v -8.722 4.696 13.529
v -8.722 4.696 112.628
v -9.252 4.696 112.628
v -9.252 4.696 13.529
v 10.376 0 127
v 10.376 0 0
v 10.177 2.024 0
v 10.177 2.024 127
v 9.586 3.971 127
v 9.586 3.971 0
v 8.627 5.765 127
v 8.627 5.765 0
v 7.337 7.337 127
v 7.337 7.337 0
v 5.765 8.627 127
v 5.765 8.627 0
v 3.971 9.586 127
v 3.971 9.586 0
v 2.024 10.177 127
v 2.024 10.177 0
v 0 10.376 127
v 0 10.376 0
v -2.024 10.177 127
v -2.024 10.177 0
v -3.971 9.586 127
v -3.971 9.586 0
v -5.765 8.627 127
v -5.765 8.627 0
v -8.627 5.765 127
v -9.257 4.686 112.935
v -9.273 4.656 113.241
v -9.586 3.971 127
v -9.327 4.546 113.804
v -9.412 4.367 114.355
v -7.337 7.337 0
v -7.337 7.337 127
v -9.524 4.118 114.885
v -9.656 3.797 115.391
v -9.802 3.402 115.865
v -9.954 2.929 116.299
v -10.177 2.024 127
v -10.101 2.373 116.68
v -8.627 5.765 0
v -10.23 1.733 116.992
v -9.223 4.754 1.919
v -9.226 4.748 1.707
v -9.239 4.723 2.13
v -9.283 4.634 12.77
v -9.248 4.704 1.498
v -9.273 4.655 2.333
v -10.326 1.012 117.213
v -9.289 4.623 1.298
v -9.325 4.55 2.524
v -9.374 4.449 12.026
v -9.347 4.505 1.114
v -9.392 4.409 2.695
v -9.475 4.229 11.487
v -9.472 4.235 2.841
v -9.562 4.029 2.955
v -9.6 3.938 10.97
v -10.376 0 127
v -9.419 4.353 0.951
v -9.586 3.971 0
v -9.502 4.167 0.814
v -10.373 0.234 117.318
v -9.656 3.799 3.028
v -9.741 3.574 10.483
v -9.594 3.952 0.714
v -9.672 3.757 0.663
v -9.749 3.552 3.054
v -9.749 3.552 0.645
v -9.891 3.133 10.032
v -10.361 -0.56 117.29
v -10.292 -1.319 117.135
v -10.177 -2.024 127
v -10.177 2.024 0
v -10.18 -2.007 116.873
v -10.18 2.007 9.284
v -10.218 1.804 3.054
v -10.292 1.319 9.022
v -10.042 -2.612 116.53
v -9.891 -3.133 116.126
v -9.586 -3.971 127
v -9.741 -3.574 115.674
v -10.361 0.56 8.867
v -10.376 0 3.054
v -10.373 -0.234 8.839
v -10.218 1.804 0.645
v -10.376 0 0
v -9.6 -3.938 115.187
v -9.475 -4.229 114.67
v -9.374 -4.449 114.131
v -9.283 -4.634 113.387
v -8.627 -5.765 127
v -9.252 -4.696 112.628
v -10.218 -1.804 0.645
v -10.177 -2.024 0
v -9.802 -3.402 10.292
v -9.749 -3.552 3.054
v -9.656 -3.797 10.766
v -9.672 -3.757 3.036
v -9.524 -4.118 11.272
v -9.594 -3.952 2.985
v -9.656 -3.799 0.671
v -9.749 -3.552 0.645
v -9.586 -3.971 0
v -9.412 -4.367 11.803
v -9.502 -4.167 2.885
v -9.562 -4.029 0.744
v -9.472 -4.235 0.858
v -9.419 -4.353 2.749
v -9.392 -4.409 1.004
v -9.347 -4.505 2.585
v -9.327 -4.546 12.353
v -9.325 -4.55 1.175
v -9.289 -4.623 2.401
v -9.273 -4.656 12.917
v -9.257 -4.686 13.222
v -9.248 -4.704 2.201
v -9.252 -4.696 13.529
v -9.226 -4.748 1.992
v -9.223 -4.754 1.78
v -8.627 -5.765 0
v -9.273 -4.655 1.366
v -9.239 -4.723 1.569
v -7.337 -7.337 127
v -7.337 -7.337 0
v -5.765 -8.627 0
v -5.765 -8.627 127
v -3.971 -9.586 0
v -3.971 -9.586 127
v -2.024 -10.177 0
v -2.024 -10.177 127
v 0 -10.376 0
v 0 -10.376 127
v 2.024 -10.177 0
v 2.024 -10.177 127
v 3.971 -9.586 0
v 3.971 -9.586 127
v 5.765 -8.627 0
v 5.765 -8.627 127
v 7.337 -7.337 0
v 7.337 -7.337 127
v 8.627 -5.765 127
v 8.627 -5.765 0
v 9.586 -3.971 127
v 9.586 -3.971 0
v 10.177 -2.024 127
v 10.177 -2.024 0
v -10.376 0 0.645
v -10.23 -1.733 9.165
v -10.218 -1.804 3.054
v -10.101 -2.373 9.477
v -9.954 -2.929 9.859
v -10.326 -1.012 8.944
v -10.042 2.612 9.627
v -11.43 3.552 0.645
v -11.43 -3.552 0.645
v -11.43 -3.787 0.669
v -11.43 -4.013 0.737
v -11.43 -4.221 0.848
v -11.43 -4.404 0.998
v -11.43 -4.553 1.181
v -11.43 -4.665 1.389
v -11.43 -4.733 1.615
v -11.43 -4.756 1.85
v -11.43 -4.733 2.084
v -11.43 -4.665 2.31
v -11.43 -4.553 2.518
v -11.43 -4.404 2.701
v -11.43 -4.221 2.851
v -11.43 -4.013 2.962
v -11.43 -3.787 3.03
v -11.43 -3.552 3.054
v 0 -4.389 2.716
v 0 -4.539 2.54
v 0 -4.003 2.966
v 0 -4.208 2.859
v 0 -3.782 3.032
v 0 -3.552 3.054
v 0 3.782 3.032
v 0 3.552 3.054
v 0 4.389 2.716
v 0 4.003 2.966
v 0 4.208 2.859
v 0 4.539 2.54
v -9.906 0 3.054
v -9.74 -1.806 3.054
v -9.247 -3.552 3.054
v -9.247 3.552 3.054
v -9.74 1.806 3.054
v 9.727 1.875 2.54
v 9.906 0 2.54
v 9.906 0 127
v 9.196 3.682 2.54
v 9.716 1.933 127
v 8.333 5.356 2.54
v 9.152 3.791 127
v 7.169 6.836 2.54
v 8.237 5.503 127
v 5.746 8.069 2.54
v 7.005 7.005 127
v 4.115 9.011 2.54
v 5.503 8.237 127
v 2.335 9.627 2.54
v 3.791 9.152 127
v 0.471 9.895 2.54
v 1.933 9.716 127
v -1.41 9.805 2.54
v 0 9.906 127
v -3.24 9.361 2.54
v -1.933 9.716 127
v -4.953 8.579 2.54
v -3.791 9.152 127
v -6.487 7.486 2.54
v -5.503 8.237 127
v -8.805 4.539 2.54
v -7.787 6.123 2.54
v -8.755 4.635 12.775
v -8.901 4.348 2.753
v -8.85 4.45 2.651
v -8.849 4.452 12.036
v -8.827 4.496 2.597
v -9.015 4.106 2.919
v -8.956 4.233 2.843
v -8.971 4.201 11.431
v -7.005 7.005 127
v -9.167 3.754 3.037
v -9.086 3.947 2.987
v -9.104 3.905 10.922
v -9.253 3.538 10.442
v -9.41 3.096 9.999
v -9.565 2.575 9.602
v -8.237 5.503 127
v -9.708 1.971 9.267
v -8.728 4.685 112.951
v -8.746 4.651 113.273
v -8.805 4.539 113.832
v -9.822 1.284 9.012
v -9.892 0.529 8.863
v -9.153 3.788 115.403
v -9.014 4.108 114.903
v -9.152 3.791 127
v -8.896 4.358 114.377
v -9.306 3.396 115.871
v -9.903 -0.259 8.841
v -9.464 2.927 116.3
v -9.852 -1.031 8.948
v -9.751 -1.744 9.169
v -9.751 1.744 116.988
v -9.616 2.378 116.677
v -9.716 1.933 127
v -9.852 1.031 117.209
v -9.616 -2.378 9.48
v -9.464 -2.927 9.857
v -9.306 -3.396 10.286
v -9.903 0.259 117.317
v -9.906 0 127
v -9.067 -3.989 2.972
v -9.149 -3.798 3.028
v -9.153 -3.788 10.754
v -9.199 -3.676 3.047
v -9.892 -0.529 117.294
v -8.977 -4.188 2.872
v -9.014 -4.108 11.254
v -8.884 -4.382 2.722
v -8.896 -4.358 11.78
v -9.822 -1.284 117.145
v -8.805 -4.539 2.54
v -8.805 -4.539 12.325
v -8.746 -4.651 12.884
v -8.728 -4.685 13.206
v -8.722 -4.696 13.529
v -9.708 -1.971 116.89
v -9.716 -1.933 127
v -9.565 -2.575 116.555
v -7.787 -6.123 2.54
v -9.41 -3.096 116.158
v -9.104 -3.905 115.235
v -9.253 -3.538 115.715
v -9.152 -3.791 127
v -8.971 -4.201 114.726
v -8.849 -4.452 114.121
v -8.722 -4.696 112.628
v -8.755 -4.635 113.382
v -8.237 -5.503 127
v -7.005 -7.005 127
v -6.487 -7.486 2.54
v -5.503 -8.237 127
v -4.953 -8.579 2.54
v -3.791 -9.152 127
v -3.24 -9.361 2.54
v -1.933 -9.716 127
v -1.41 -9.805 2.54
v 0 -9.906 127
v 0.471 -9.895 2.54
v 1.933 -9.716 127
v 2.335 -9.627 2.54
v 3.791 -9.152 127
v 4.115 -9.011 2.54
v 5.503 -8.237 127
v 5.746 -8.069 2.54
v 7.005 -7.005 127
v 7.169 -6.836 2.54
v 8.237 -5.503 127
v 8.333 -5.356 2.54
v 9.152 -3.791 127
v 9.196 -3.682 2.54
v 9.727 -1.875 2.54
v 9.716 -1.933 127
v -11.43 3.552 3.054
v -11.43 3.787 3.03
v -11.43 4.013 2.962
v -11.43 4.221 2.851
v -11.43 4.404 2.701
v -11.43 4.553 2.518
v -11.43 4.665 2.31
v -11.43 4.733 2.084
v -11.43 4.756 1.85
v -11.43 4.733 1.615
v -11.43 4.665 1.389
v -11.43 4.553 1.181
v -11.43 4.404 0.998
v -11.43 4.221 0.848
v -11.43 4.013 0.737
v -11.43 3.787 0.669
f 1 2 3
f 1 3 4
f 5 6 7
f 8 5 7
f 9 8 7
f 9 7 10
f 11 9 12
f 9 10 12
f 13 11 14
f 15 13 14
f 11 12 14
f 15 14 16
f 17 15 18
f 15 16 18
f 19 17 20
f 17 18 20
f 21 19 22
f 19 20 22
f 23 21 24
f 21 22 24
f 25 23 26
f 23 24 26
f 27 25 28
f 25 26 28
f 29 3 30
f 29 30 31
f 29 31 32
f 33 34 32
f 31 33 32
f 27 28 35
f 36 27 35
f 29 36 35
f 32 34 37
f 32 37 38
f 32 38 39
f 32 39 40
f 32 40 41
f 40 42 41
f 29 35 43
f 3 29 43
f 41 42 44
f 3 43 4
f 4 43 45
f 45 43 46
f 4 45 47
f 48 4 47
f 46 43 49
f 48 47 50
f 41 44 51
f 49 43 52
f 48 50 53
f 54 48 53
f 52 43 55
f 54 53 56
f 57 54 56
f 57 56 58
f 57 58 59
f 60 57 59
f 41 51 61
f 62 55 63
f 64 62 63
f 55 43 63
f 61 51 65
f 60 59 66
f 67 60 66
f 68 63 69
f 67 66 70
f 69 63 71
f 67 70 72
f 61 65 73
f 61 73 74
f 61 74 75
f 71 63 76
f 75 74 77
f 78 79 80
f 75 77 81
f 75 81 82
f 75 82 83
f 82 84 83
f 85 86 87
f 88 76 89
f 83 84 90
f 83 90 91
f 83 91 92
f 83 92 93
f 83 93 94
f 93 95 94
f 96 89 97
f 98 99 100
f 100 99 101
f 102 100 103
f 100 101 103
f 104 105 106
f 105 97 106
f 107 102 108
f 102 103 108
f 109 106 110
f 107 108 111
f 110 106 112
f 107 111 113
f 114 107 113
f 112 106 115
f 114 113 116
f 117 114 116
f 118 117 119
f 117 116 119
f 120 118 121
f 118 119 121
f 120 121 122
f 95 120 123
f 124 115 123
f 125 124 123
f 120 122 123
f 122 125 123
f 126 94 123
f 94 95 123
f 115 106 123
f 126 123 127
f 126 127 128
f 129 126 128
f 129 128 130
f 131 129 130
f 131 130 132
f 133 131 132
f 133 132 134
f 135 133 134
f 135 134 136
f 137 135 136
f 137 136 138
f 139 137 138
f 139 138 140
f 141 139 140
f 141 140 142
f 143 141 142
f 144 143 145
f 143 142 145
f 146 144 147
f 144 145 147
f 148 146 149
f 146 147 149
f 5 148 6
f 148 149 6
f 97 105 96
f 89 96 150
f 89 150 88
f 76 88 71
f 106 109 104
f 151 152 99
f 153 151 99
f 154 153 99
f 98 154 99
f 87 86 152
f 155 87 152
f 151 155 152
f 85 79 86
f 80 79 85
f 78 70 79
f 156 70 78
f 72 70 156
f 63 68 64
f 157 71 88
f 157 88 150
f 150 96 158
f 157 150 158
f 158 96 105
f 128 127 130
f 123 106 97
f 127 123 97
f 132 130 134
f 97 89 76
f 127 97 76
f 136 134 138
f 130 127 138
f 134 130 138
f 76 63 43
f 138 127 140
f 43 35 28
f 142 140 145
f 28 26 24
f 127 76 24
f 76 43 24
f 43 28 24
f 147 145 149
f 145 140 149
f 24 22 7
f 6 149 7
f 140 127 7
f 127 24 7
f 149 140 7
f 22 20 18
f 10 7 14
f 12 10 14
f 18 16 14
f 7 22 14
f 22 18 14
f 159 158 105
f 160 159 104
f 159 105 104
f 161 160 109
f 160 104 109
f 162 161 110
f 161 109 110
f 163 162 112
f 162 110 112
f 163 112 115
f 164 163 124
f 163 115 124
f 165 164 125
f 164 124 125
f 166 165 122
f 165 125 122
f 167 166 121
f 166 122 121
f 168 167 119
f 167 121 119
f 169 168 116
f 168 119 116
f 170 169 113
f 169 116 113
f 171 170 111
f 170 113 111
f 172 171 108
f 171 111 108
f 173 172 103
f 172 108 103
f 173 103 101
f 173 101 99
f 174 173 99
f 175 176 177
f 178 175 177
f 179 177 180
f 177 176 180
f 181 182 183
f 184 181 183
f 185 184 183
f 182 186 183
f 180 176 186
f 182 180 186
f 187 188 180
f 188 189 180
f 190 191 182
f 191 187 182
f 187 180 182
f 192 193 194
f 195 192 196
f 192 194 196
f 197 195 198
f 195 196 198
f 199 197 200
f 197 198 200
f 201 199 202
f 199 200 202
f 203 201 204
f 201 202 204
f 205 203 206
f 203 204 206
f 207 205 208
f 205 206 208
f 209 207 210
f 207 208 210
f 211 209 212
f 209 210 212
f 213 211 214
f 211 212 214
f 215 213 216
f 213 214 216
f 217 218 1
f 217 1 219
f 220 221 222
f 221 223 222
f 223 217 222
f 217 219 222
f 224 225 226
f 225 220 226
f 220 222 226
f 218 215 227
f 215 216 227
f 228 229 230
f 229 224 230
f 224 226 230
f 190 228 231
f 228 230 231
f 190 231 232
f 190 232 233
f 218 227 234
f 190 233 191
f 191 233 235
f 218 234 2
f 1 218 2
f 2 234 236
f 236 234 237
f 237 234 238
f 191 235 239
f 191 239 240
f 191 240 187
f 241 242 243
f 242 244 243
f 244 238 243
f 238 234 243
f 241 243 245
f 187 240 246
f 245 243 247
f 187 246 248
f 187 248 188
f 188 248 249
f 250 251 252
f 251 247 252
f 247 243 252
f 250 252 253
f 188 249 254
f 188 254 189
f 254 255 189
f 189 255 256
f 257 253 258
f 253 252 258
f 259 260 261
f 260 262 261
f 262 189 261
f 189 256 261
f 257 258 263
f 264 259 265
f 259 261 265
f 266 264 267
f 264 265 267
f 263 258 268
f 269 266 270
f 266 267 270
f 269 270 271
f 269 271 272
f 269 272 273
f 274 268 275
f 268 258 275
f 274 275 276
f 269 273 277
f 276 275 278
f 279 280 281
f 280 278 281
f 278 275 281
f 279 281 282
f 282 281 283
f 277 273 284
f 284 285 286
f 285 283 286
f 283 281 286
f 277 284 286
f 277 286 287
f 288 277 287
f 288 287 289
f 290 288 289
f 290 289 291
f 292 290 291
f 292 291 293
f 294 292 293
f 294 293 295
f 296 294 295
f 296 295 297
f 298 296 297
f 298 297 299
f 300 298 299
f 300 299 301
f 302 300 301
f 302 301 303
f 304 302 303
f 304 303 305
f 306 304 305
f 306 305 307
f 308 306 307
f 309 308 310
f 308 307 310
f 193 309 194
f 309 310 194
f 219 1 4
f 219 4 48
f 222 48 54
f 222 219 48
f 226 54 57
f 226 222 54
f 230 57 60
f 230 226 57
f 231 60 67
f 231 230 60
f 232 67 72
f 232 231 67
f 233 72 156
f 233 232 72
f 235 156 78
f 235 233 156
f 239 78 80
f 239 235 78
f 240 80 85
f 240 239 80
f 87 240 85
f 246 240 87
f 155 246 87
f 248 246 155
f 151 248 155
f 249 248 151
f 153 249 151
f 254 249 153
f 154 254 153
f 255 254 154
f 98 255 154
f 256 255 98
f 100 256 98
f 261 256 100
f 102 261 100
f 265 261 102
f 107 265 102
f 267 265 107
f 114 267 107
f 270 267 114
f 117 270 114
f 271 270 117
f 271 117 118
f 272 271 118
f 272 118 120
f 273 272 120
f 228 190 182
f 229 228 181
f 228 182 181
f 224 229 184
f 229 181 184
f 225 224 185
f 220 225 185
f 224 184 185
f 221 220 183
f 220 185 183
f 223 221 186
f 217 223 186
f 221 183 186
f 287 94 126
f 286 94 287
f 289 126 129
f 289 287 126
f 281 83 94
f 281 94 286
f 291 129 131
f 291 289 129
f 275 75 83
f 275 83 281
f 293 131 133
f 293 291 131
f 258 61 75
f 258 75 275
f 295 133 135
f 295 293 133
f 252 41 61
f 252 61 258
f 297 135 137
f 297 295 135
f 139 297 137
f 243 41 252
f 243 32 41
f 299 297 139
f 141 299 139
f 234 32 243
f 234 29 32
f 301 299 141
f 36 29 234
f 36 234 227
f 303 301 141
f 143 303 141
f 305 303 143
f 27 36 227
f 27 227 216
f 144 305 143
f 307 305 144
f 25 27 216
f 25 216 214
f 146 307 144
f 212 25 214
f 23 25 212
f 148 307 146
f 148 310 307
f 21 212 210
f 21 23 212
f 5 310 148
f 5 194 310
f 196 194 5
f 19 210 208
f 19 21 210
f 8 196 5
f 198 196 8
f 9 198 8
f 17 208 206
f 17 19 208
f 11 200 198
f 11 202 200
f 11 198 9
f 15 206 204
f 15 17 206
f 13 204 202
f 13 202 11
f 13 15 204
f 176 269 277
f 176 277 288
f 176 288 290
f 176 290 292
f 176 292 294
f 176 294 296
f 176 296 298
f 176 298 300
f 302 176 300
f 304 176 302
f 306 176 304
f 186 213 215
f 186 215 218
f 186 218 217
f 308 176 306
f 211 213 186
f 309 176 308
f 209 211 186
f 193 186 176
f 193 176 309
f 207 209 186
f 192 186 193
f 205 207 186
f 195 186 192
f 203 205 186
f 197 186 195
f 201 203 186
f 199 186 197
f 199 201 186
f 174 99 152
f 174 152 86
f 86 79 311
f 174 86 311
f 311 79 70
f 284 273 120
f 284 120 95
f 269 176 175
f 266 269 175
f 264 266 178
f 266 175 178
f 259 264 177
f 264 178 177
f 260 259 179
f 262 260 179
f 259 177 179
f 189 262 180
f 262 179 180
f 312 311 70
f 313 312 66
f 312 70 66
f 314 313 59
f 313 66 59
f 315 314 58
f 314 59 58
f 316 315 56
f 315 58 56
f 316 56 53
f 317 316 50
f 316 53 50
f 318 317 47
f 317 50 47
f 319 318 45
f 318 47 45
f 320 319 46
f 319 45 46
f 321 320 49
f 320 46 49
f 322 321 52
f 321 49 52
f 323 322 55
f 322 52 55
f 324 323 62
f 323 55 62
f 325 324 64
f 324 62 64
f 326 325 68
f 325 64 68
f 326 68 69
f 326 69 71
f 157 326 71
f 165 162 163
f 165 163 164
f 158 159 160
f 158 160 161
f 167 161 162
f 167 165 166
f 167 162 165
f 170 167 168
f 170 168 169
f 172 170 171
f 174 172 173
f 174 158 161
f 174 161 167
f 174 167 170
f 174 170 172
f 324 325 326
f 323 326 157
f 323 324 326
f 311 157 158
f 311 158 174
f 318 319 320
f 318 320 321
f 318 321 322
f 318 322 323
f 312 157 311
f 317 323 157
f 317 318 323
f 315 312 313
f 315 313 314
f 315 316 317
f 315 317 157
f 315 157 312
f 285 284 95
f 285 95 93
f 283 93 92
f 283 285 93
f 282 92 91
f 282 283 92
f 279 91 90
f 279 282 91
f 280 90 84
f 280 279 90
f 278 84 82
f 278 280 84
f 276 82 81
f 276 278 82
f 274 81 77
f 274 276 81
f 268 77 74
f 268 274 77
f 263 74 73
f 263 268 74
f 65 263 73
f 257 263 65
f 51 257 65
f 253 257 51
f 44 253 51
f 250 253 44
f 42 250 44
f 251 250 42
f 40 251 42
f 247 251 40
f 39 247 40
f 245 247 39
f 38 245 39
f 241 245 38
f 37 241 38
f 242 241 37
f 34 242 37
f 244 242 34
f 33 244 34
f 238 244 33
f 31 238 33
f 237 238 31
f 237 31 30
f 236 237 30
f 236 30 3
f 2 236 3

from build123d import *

# Parameters (mm, degrees)
SKETCH2_R           = 10.3759
BOSS_EXTRUDE1_DEPTH = 127
SKETCH3_R           = 9.906
CUT_EXTRUDE1_DEPTH  = 124.46
CUT_EXTRUDE2_DEPTH  = 12.7
BOSS_EXTRUDE2_DEPTH = 11.43


with BuildPart() as part:
    # Sketch2 → Boss-Extrude1 (new body)
    with BuildSketch(Plane.XY):
        Circle(SKETCH2_R)
    extrude(amount=BOSS_EXTRUDE1_DEPTH)

    # Sketch3 → Cut-Extrude1 (cut)
    with BuildSketch(Plane.XY.offset(127)):
        Circle(SKETCH3_R)
    extrude(amount=-CUT_EXTRUDE1_DEPTH, mode=Mode.SUBTRACT)

    # Sketch4 → Cut-Extrude2 (cut)
    with BuildSketch(Plane(origin=(0, 0, 0), x_dir=(0, 0, -1), z_dir=(1, 0, 0))):
        with BuildLine():
            Line((-112.627725765, 4.69603261), (-13.529396587, 4.69603261))
            ThreePointArc((-13.529396587, 4.69603261), (-8.833363977, 0), (-13.529396587, -4.69603261))
            Line((-13.529396587, -4.69603261), (-112.627725765, -4.69603261))
            ThreePointArc((-112.627725765, -4.69603261), (-117.323758375, 0), (-112.627725765, 4.69603261))
        make_face()
    extrude(amount=-CUT_EXTRUDE2_DEPTH, mode=Mode.SUBTRACT)

    # Sketch5 → Boss-Extrude2 (add)
    with BuildSketch(Plane(origin=(0, 0, 0), x_dir=(0, 0, -1), z_dir=(1, 0, 0))):
        with BuildLine():
            Line((-0.645409683, 3.552127231), (-0.645409683, -3.552127231))
            ThreePointArc((-0.645409683, -3.552127231), (-1.849520609, -4.756238156), (-3.053631534, -3.552127231))
            Line((-3.053631534, -3.552127231), (-3.053631534, 3.552127231))
            ThreePointArc((-3.053631534, 3.552127231), (-1.849520609, 4.756238156), (-0.645409683, 3.552127231))
        make_face()
    extrude(amount=-BOSS_EXTRUDE2_DEPTH)


solid = part.part
